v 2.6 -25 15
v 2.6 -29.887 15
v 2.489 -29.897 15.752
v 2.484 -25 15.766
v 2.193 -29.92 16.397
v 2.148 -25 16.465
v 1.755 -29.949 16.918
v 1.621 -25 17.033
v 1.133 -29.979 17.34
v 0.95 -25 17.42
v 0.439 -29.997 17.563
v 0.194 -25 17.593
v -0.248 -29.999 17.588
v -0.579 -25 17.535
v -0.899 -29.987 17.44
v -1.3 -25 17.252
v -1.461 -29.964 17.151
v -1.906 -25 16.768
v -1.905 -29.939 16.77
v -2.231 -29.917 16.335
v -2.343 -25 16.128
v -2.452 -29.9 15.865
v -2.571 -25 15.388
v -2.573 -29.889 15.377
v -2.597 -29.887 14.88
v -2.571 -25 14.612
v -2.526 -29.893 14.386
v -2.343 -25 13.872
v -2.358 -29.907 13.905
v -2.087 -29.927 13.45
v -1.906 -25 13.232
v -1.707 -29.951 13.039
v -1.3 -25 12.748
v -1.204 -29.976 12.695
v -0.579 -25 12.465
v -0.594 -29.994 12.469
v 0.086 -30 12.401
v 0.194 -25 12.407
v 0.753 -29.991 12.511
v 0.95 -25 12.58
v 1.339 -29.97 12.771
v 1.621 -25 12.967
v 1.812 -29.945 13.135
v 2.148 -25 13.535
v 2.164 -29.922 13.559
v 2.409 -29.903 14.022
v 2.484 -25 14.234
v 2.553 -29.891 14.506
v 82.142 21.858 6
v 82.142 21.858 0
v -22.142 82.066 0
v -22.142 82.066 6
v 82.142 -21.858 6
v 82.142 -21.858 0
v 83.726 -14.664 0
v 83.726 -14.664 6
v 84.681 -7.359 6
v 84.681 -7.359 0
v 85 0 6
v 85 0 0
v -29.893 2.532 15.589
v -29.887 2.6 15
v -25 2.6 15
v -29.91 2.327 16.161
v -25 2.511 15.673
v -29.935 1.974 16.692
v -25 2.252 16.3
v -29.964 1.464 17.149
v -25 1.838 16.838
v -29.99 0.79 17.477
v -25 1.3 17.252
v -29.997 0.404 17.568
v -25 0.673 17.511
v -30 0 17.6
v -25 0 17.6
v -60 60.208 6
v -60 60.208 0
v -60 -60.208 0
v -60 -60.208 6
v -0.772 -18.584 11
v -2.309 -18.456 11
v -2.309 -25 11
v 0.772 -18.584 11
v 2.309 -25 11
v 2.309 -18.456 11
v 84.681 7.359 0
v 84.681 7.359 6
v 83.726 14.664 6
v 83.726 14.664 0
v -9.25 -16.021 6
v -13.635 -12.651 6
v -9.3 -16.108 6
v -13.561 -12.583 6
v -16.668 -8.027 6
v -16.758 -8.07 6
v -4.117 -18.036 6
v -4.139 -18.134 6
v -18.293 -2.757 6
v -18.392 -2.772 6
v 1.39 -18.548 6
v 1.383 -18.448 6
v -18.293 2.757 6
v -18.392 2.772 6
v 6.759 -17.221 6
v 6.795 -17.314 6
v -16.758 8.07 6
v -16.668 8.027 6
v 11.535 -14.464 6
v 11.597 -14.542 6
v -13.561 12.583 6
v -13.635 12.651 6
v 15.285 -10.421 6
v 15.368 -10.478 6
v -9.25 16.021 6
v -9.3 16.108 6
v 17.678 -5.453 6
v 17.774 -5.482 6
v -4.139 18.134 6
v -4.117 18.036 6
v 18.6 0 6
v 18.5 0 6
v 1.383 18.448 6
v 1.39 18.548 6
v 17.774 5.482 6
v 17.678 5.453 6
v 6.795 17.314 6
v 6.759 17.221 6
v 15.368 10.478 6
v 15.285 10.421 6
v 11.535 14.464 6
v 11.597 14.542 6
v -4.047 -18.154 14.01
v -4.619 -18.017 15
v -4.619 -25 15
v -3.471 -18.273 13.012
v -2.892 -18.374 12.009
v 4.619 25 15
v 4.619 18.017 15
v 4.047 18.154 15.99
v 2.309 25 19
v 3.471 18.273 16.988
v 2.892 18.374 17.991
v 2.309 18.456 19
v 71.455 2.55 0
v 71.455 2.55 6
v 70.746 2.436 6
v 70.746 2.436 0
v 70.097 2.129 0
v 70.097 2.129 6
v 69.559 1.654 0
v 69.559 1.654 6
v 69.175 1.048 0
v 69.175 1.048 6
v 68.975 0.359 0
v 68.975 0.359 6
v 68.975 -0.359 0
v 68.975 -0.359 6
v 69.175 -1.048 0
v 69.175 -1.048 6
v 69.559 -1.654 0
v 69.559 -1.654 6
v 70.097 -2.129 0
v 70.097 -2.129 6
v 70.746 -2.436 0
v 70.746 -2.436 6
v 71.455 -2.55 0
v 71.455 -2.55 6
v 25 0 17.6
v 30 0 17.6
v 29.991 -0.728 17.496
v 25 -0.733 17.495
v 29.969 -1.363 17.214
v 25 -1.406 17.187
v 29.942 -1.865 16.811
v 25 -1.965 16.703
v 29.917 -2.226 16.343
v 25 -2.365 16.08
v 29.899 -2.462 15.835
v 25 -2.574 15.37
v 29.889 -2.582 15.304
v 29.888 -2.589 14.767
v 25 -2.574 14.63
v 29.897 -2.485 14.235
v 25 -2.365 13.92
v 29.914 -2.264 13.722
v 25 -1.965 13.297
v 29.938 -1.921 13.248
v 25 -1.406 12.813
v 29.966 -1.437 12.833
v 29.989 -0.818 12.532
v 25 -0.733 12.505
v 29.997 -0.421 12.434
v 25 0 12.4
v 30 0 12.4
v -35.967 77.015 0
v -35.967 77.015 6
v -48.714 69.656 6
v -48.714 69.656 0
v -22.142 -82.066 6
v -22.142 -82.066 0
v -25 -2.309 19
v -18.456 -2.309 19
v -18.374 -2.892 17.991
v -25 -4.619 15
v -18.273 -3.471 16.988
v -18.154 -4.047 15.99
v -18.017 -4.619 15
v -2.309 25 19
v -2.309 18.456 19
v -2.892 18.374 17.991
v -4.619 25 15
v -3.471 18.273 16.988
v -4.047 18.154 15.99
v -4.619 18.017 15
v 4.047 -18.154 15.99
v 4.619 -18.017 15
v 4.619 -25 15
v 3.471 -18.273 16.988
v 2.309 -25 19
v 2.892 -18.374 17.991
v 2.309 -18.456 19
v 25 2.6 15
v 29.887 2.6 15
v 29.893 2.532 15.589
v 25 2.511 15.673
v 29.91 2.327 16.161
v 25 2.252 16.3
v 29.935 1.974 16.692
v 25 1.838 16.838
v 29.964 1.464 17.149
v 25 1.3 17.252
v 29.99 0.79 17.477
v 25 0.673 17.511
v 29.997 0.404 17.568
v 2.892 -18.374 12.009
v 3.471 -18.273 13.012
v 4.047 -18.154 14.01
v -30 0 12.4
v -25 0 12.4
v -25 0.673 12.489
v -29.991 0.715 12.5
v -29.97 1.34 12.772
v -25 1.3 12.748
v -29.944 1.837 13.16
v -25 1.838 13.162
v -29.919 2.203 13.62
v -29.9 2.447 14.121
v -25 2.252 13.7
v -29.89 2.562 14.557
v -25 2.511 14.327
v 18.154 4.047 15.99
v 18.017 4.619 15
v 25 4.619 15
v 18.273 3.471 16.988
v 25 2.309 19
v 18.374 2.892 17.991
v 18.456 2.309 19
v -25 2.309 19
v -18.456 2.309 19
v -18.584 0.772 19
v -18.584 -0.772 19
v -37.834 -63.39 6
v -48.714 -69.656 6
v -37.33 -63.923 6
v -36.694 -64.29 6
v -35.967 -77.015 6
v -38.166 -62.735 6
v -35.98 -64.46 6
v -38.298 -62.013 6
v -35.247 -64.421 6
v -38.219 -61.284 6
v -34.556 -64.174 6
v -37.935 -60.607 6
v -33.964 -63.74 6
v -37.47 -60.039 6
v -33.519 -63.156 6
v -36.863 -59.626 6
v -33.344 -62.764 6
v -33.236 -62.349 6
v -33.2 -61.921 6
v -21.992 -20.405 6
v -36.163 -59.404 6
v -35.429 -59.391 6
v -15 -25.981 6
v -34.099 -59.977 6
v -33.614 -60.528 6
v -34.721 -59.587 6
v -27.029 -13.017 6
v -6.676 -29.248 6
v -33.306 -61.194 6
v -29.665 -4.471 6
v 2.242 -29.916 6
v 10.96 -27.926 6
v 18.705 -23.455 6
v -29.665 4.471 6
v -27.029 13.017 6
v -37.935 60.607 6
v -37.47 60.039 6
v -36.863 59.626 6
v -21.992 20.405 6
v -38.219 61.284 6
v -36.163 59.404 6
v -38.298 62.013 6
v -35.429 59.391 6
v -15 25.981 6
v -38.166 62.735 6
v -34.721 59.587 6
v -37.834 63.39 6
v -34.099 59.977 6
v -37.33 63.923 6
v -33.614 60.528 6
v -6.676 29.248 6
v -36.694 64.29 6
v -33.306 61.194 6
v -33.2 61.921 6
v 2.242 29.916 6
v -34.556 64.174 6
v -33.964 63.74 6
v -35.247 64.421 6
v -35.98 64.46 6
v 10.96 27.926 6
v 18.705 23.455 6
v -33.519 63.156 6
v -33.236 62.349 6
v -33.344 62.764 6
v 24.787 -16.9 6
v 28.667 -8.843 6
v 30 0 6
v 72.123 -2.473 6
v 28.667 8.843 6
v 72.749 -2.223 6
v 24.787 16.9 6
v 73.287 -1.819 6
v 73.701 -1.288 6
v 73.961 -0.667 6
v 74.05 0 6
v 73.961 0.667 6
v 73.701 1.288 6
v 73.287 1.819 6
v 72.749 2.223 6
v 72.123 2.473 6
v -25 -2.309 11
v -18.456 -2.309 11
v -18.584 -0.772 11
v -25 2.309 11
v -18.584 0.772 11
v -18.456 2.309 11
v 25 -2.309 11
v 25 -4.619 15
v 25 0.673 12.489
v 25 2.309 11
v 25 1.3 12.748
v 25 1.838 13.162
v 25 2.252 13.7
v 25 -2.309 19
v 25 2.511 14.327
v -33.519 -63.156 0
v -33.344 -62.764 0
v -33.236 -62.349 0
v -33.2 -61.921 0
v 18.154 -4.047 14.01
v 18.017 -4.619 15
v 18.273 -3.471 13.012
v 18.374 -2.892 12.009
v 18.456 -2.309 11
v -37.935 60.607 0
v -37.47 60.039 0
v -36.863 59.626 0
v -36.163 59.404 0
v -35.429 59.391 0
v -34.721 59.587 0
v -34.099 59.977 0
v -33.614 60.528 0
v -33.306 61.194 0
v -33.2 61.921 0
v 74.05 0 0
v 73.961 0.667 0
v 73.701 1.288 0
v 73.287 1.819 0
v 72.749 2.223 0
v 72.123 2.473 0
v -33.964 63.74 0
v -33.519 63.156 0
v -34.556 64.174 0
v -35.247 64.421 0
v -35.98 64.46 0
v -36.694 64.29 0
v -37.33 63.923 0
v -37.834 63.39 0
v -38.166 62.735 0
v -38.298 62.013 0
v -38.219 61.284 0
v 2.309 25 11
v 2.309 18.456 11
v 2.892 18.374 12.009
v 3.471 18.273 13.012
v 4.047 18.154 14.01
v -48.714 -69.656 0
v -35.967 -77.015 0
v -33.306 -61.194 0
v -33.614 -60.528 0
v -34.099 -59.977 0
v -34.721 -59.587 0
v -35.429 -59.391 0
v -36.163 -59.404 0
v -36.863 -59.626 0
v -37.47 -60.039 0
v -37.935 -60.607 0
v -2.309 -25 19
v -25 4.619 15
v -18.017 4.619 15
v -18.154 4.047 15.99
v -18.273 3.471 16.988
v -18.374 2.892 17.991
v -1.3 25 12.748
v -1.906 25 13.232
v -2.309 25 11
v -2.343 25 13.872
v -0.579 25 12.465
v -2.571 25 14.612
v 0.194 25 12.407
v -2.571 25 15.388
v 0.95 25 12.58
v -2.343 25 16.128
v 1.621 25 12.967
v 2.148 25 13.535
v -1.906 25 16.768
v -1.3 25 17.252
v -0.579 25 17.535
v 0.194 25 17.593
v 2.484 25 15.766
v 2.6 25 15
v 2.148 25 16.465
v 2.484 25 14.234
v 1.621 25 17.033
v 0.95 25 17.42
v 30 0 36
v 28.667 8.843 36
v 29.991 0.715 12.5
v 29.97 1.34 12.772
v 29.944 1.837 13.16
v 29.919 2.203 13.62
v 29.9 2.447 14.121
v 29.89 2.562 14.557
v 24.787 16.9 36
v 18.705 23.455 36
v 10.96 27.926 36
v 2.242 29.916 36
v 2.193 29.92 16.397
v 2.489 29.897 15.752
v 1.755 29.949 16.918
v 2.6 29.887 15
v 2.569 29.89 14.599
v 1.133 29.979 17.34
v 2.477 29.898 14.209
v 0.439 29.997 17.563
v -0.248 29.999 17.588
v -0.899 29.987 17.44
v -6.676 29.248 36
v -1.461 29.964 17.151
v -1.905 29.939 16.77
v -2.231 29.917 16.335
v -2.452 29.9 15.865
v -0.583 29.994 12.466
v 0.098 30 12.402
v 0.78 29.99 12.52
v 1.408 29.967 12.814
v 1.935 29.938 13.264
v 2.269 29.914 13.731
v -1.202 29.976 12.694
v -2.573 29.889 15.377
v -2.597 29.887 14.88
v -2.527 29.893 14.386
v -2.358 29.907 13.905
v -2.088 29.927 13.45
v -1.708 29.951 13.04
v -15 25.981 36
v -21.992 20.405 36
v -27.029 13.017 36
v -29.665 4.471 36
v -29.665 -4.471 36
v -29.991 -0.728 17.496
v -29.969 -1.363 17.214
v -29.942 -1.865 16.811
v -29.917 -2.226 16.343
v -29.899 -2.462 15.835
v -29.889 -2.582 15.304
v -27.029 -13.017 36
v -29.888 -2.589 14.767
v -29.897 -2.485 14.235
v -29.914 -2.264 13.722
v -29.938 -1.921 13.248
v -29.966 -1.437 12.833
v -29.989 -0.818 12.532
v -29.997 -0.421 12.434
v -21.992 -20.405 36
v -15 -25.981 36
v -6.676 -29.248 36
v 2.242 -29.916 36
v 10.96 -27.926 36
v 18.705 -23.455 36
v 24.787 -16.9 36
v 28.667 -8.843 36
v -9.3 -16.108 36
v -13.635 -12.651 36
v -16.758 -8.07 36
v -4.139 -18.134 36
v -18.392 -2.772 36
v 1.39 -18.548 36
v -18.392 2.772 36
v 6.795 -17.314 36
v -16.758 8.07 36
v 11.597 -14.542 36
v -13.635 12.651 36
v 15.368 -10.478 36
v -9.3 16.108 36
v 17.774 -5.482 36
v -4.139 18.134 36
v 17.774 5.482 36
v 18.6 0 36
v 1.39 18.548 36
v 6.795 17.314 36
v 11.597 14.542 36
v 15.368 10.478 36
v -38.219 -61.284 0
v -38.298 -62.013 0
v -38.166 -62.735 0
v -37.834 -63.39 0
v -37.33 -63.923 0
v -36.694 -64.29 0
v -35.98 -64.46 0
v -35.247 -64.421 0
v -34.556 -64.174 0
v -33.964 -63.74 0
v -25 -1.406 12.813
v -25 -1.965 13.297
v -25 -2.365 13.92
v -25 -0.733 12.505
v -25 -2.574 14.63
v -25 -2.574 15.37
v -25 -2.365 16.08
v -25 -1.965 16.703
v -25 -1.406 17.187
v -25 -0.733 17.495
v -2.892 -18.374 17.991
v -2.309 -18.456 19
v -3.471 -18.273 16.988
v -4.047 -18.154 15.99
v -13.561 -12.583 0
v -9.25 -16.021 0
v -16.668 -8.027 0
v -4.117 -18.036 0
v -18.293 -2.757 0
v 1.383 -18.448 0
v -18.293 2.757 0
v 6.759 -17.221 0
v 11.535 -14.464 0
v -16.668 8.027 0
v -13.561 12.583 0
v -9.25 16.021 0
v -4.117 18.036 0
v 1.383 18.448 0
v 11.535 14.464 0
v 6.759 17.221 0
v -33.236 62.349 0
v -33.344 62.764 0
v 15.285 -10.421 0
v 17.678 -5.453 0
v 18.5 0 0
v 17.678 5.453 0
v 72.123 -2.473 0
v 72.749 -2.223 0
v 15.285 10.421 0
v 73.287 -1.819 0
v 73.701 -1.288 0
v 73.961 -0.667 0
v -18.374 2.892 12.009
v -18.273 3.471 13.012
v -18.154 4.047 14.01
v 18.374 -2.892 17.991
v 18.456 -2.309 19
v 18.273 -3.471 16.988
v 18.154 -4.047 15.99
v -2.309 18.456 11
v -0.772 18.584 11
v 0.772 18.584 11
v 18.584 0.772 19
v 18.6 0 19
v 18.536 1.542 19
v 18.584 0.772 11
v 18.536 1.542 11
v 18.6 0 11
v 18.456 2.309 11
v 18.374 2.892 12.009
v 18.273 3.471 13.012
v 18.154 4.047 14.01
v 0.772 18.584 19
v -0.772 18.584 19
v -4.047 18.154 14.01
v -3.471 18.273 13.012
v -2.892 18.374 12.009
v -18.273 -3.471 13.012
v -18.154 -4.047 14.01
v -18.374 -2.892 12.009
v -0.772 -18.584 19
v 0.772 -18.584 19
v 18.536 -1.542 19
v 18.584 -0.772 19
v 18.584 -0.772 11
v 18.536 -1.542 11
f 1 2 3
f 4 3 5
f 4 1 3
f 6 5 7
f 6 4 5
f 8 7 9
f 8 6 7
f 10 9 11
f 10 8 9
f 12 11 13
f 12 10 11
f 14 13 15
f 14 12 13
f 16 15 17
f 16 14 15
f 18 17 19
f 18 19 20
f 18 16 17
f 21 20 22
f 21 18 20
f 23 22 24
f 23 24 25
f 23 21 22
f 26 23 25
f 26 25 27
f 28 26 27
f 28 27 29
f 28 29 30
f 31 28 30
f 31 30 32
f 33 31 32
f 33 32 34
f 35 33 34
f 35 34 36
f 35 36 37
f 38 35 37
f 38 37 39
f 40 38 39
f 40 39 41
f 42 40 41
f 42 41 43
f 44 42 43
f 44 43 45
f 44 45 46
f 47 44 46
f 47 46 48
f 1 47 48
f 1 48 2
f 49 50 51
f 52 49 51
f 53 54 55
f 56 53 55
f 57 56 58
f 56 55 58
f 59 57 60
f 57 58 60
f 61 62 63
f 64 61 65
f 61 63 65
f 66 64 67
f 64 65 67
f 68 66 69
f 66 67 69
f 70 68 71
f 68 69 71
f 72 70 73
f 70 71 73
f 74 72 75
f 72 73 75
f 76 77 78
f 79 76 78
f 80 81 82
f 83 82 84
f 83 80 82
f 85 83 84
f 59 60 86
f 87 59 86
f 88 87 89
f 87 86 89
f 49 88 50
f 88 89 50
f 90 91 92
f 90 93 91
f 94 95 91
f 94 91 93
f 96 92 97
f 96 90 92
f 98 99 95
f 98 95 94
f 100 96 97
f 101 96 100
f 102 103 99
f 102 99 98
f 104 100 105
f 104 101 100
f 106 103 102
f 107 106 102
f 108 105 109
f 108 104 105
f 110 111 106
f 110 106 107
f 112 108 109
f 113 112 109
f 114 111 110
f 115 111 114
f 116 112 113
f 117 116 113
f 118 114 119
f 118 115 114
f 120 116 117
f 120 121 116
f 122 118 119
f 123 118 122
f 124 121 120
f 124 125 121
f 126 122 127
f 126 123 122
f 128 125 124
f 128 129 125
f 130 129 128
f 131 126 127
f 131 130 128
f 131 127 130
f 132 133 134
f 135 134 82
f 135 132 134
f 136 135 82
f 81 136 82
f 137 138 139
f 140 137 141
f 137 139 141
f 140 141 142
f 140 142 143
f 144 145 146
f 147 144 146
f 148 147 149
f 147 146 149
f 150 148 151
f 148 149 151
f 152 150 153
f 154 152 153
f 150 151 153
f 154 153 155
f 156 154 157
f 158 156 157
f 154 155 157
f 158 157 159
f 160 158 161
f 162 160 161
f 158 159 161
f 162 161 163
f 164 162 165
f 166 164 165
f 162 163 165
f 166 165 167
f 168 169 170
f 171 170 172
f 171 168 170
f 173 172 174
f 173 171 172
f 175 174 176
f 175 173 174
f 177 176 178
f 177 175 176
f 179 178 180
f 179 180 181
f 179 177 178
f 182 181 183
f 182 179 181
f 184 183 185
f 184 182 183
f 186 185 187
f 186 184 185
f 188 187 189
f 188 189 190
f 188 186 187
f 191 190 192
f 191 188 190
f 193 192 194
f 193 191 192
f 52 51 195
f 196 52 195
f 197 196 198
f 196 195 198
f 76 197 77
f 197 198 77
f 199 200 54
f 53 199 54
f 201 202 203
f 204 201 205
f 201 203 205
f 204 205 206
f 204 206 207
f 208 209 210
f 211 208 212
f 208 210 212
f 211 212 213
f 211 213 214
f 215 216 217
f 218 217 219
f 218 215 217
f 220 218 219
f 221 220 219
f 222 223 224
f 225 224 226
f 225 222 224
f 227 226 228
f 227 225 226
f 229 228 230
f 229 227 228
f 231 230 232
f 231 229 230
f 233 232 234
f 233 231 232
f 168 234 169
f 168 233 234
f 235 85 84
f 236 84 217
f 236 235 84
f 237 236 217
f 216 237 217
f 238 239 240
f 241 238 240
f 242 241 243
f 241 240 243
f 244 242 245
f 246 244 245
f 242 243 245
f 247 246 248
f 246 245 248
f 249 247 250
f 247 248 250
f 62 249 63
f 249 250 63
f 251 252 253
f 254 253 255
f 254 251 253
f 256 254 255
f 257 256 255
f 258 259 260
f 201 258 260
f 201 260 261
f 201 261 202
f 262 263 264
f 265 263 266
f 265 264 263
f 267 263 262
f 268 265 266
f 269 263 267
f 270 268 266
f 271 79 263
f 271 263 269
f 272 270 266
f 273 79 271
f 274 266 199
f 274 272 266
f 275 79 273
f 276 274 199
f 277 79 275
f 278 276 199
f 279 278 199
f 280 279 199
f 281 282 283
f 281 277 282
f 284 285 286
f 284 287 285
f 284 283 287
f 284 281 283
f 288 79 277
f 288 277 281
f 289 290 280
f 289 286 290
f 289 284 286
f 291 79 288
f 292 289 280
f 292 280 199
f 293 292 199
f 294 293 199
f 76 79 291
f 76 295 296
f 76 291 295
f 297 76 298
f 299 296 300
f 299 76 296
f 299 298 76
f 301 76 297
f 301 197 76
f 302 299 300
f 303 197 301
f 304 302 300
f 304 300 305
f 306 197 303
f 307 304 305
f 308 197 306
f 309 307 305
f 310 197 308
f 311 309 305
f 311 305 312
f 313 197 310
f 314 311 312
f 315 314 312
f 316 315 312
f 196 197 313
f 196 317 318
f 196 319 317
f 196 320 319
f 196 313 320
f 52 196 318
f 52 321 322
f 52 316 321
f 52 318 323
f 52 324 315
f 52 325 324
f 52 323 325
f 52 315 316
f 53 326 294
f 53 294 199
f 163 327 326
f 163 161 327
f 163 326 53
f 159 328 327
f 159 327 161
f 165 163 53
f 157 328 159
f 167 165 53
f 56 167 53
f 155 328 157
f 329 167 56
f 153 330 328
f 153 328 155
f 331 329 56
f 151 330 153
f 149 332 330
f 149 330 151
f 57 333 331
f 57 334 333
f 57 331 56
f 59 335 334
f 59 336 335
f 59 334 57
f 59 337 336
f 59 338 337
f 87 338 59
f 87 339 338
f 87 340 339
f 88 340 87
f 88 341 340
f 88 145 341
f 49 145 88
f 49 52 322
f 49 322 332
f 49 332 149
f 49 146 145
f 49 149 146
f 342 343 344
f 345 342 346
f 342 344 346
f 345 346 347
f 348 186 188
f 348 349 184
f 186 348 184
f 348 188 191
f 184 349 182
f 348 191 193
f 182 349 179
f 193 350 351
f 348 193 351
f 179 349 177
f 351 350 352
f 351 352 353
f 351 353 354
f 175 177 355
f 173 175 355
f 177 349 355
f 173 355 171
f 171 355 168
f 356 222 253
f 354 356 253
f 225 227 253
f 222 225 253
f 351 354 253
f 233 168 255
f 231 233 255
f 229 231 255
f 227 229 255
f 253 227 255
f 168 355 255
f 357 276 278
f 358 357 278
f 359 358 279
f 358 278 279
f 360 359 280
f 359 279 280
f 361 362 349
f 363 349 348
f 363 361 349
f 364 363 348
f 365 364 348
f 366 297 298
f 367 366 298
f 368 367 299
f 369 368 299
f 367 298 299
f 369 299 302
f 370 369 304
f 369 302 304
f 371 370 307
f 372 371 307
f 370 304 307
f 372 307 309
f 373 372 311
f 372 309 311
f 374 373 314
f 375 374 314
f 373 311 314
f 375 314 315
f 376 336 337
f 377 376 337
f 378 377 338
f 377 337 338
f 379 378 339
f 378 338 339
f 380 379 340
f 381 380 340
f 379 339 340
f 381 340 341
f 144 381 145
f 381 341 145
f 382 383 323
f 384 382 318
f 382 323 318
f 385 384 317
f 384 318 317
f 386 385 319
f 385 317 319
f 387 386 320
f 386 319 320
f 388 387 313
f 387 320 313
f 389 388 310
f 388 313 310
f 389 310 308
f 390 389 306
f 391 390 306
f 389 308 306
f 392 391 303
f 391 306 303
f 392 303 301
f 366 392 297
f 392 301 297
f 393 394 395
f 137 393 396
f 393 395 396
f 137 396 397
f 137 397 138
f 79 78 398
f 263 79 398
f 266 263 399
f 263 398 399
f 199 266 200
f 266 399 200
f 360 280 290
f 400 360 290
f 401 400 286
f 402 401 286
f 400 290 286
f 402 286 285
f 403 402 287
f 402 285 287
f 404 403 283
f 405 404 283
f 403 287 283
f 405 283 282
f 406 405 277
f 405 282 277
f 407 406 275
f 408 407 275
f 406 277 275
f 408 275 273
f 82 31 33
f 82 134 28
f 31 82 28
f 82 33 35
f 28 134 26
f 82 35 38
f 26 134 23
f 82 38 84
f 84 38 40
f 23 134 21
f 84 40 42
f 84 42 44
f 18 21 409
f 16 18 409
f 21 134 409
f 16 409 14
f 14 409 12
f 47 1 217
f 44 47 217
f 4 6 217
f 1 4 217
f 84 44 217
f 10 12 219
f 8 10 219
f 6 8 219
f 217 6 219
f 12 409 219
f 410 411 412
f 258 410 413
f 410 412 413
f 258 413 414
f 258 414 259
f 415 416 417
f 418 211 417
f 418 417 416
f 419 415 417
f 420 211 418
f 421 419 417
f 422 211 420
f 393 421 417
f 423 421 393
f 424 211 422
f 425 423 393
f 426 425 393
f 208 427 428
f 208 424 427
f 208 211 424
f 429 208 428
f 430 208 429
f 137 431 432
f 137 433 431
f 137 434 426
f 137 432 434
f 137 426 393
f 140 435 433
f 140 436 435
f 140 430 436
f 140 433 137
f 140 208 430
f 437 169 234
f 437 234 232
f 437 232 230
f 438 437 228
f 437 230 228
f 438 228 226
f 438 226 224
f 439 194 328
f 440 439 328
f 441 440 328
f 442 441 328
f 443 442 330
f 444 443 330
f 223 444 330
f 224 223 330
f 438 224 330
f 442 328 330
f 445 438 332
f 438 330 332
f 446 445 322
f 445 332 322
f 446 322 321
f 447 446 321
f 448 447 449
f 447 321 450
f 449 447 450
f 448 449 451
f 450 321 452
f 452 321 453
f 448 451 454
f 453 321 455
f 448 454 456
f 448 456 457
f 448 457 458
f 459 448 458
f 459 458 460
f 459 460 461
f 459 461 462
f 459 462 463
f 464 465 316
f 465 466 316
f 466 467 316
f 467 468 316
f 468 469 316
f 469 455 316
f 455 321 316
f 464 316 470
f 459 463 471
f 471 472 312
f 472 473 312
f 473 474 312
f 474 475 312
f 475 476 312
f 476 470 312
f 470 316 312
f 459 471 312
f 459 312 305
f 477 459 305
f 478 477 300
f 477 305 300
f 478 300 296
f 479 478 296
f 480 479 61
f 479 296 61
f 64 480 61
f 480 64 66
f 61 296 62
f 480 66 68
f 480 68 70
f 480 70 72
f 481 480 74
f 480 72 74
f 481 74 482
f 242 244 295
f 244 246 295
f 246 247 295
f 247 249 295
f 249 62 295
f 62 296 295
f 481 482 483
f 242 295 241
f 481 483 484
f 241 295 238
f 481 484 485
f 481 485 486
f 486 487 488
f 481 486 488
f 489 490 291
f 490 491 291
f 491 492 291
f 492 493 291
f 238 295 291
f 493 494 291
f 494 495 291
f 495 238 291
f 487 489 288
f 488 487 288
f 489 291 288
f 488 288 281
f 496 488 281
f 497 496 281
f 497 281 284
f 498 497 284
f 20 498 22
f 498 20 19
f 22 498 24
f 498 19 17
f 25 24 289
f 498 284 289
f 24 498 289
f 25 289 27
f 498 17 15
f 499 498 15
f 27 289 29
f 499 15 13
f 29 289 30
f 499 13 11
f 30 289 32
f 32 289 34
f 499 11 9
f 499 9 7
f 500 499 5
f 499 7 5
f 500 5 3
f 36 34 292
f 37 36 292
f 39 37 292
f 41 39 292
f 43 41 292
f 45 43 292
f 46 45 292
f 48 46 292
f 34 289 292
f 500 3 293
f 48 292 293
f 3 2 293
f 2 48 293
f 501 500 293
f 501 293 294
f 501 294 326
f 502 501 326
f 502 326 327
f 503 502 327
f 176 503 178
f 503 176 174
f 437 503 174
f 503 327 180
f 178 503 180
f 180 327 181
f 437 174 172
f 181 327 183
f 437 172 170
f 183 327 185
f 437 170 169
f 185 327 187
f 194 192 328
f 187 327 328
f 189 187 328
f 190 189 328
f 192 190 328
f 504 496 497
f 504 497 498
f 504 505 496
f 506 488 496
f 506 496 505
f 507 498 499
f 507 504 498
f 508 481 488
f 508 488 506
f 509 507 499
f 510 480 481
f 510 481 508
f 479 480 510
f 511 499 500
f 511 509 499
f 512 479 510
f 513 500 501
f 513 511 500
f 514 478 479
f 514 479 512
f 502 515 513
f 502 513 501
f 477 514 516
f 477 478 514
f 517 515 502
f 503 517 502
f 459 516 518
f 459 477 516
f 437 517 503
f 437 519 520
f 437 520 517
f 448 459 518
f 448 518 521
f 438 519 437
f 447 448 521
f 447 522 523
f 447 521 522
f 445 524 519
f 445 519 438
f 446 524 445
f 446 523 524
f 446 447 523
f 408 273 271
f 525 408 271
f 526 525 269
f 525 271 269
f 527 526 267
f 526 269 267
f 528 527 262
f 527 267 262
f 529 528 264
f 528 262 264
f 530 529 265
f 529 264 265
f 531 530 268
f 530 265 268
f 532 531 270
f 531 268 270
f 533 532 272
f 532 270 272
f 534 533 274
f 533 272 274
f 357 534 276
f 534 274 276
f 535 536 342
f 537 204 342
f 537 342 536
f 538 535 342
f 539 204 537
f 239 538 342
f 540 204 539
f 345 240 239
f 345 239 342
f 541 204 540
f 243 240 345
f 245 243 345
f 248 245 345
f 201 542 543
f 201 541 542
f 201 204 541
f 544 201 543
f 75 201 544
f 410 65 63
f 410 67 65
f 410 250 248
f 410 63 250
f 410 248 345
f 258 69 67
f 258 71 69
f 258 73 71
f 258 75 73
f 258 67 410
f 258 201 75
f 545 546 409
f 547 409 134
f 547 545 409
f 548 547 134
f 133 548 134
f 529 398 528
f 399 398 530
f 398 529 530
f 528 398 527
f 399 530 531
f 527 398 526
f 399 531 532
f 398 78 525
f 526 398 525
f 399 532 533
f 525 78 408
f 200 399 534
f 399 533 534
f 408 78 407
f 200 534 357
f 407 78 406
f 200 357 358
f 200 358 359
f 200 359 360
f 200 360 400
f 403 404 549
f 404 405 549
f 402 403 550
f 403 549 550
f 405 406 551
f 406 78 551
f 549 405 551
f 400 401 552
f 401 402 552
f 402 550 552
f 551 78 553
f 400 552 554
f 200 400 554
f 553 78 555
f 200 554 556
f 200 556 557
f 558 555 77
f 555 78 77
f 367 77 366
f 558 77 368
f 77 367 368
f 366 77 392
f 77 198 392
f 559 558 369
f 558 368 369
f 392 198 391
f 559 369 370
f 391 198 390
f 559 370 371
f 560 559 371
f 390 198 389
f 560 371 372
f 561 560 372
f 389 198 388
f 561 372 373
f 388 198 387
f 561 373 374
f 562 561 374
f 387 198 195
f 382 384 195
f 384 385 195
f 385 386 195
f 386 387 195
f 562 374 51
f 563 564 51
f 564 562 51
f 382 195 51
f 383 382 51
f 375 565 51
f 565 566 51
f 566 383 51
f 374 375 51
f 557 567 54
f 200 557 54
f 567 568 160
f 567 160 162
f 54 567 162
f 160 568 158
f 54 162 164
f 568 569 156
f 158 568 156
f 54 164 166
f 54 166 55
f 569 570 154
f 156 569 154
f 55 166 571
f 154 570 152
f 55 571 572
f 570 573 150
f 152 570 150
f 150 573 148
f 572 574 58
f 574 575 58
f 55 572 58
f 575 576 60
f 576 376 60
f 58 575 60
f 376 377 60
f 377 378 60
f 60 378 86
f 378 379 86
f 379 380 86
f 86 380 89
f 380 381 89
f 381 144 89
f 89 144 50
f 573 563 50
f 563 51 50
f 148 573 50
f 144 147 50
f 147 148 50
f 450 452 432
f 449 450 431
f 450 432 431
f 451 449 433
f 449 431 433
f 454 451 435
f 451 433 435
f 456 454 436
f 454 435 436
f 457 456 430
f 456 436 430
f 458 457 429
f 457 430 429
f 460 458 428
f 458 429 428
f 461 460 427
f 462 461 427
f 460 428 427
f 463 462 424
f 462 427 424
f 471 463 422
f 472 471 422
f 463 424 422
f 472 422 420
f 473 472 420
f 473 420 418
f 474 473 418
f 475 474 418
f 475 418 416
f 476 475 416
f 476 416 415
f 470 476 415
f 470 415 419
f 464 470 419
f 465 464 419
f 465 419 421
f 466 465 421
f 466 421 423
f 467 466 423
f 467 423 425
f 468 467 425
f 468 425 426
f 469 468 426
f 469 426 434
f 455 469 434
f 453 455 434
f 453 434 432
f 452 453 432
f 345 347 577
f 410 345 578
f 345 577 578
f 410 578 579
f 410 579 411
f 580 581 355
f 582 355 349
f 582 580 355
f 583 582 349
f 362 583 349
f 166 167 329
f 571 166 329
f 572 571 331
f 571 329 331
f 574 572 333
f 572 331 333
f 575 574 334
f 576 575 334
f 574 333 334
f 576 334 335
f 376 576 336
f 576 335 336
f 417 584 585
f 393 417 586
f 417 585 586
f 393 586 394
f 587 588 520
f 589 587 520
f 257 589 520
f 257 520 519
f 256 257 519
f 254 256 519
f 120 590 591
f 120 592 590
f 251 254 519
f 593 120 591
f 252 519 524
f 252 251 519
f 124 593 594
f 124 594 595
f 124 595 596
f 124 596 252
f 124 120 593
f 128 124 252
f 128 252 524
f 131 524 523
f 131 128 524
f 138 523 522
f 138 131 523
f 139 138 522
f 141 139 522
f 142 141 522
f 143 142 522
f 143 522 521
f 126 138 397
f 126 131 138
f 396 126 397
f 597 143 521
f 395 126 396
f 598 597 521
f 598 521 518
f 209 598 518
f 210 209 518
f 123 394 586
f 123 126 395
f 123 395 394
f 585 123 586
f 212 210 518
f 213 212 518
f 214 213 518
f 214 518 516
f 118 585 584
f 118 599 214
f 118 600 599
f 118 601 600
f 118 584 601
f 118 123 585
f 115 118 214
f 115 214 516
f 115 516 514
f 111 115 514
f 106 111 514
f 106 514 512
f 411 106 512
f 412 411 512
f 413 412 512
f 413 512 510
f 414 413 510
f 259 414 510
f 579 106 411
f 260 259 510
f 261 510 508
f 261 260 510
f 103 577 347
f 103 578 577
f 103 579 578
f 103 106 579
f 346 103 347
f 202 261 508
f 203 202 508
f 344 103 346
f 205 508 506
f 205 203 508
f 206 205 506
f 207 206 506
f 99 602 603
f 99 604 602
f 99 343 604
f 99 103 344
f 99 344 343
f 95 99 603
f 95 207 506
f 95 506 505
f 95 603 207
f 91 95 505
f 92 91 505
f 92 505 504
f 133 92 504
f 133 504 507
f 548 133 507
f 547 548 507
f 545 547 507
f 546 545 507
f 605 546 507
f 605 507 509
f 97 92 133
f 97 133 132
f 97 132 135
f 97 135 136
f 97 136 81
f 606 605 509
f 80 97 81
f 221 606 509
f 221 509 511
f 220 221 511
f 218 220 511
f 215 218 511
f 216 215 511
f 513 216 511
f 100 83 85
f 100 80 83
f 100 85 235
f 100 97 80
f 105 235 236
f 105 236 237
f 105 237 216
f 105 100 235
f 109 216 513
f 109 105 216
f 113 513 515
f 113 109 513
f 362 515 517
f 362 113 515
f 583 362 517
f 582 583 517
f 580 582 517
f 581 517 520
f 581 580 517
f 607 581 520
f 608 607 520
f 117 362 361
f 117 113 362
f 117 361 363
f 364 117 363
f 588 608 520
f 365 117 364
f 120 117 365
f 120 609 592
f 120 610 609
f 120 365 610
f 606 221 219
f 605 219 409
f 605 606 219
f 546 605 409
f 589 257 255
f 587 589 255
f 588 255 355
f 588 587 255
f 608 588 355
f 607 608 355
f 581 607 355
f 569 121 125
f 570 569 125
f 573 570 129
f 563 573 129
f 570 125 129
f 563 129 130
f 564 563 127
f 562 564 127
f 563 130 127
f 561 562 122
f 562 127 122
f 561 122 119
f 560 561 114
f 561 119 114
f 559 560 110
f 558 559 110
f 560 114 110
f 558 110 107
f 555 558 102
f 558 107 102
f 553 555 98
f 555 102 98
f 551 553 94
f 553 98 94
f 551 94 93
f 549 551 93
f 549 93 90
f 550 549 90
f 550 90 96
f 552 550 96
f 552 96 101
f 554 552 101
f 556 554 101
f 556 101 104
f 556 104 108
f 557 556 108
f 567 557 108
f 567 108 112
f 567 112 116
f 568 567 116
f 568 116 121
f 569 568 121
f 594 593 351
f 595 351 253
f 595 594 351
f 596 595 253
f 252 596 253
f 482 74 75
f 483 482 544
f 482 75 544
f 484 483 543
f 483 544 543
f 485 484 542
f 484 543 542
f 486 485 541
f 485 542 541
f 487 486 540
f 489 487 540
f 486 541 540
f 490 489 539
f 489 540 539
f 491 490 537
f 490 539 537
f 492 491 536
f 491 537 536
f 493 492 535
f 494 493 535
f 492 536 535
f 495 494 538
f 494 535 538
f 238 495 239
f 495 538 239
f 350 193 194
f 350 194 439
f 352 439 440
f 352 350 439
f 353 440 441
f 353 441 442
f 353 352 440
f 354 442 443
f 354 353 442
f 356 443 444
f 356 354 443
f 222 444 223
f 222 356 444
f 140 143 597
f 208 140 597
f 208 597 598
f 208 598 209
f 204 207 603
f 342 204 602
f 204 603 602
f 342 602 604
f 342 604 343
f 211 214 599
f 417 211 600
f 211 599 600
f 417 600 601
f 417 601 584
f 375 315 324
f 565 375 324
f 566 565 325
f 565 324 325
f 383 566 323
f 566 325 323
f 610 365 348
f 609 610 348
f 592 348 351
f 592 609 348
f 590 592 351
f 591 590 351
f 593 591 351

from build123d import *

# Parameters (mm, degrees)
F1_DEPTH       = 6
F3_DEPTH       = 25
F4_R           = 30
F4_R_2         = 18.6
F5_DEPTH       = 30
F6_R           = 18.5
F7_DEPTH       = 25
F9_DEPTH       = 25
F9_DEPTH_BACK  = 25
F11_DEPTH      = 25
F11_DEPTH_BACK = 25
F13_DEPTH      = 60.001
F13_DEPTH_BACK = 85.001
F14_R          = 2.6
F15_DEPTH      = 82.066510674
F15_DEPTH_BACK = 82.066510674


with BuildPart() as f1:
    # F0 (on Top) → F1 (new body)
    with BuildSketch(Plane.XY):
        with BuildLine():
            ThreePointArc((82.1416340365, -21.8575377801), (84.2823792174, -11.0218216937), (85, 0))
            ThreePointArc((85, 0), (84.2823792174, 11.0218216937), (82.1416340365, 21.8575377801))
            Line((82.1416340365, 21.8575377801), (-22.1416340365, 82.065510674))
            ThreePointArc((-22.1416340365, 82.065510674), (-42.5, 73.6121593217), (-60, 60.207972894))
            Line((-60, 60.207972894), (-60, -60.207972894))
            ThreePointArc((-60, -60.207972894), (-42.5, -73.6121593217), (-22.1416340365, -82.065510674))
            Line((-22.1416340365, -82.065510674), (82.1416340365, -21.8575377801))
        make_face()
    extrude(amount=F1_DEPTH)

    # F2 (on face) → F3 (cut)
    with BuildSketch(Plane.XY.offset(6)):
        with BuildLine():
            ThreePointArc((71.454527972, -2.5495945353), (71.4886310891, -1.275), (71.5, 0))
            ThreePointArc((71.5, 0), (71.4886310891, 1.275), (71.454527972, 2.5495945353))
            ThreePointArc((71.454527972, 2.5495945353), (68.95, 0), (71.454527972, -2.5495945353))
        make_face()
        with BuildLine():
            ThreePointArc((71.454527972, 2.5495945353), (71.4886310891, 1.275), (71.5, 0))
            ThreePointArc((71.5, 0), (71.4886310891, -1.275), (71.454527972, -2.5495945353))
            ThreePointArc((71.454527972, -2.5495945353), (73.2869731851, -1.8191280427), (74.05, 0))
            ThreePointArc((74.05, 0), (73.2869731851, 1.8191280427), (71.454527972, 2.5495945353))
        make_face()
        with BuildLine():
            ThreePointArc((-37.935277623, -60.6066391715), (-37.025, -64.1291811502), (-33.5192503491, -63.1562337069))
            ThreePointArc((-33.5192503491, -63.1562337069), (-35.75, -61.9208163706), (-37.935277623, -60.6066391715))
        make_face()
        with BuildLine():
            ThreePointArc((-37.935277623, -60.6066391715), (-35.75, -61.9208163706), (-33.5192503491, -63.1562337069))
            ThreePointArc((-33.5192503491, -63.1562337069), (-33.2811023097, -62.5588165234), (-33.2, -61.9208163706))
            ThreePointArc((-33.2, -61.9208163706), (-35.0680754949, -59.4636881751), (-37.935277623, -60.6066391715))
        make_face()
        with BuildLine():
            ThreePointArc((-37.935277623, 60.6066391715), (-35.75, 61.9208163706), (-33.5192503491, 63.1562337069))
            ThreePointArc((-33.5192503491, 63.1562337069), (-37.025, 64.1291811502), (-37.935277623, 60.6066391715))
        make_face()
        with BuildLine():
            ThreePointArc((-33.2, 61.9208163706), (-33.2811023097, 62.5588165234), (-33.5192503491, 63.1562337069))
            ThreePointArc((-33.5192503491, 63.1562337069), (-35.75, 61.9208163706), (-37.935277623, 60.6066391715))
            ThreePointArc((-37.935277623, 60.6066391715), (-35.0680754949, 59.4636881751), (-33.2, 61.9208163706))
        make_face()
    extrude(amount=-F3_DEPTH, mode=Mode.SUBTRACT)

    # F4 (on face) → F5 (join)
    with BuildSketch(Plane.XY.offset(6)):
        Circle(F4_R)
        Circle(F4_R_2, mode=Mode.SUBTRACT)
    extrude(amount=F5_DEPTH)

    # F6 (on face) → F7 (cut)
    with BuildSketch(Plane.XY.offset(6)):
        Circle(F6_R)
    extrude(amount=-F7_DEPTH, mode=Mode.SUBTRACT)

    # F8 (on Right) → F9 (cut, two sides)
    with BuildSketch(Plane.YZ) as f9_sk:
        Polygon((-2.3094010768, 11), (2.3094010768, 11), (4.6188021535, 15), (2.3094010768, 19), (-2.3094010768, 19), (-4.6188021535, 15), align=None)
    extrude(amount=F9_DEPTH, mode=Mode.SUBTRACT)
    extrude(f9_sk.sketch, amount=-F9_DEPTH_BACK, mode=Mode.SUBTRACT)

    # F10 (on Front) → F11 (cut, two sides)
    with BuildSketch(Plane.XZ) as f11_sk:
        Polygon((-2.3094010768, 11), (2.3094010768, 11), (4.6188021535, 15), (2.3094010768, 19), (-2.3094010768, 19), (-4.6188021535, 15), align=None)
    extrude(amount=F11_DEPTH, mode=Mode.SUBTRACT)
    extrude(f11_sk.sketch, amount=-F11_DEPTH_BACK, mode=Mode.SUBTRACT)

    # F12 (on Right) → F13 (cut, two sides)
    with BuildSketch(Plane.YZ) as f13_sk:
        with BuildLine():
            ThreePointArc((0, 17.6), (-2.6, 15), (0, 12.4))
            Line((0, 12.4), (0, 17.6))
        make_face()
        with BuildLine():
            Line((0, 17.6), (0, 12.4))
            ThreePointArc((0, 12.4), (1.8384776311, 13.1615223689), (2.6, 15))
            ThreePointArc((2.6, 15), (1.8384776311, 16.8384776311), (0, 17.6))
        make_face()
    extrude(amount=-F13_DEPTH, mode=Mode.SUBTRACT)
    extrude(f13_sk.sketch, amount=F13_DEPTH_BACK, mode=Mode.SUBTRACT)

    # F14 (on Front) → F15 (cut, two sides)
    with BuildSketch(Plane.XZ) as f15_sk:
        with Locations((0, 15)):
            Circle(F14_R)
    extrude(amount=F15_DEPTH, mode=Mode.SUBTRACT)
    extrude(f15_sk.sketch, amount=-F15_DEPTH_BACK, mode=Mode.SUBTRACT)


solid = f1.part
